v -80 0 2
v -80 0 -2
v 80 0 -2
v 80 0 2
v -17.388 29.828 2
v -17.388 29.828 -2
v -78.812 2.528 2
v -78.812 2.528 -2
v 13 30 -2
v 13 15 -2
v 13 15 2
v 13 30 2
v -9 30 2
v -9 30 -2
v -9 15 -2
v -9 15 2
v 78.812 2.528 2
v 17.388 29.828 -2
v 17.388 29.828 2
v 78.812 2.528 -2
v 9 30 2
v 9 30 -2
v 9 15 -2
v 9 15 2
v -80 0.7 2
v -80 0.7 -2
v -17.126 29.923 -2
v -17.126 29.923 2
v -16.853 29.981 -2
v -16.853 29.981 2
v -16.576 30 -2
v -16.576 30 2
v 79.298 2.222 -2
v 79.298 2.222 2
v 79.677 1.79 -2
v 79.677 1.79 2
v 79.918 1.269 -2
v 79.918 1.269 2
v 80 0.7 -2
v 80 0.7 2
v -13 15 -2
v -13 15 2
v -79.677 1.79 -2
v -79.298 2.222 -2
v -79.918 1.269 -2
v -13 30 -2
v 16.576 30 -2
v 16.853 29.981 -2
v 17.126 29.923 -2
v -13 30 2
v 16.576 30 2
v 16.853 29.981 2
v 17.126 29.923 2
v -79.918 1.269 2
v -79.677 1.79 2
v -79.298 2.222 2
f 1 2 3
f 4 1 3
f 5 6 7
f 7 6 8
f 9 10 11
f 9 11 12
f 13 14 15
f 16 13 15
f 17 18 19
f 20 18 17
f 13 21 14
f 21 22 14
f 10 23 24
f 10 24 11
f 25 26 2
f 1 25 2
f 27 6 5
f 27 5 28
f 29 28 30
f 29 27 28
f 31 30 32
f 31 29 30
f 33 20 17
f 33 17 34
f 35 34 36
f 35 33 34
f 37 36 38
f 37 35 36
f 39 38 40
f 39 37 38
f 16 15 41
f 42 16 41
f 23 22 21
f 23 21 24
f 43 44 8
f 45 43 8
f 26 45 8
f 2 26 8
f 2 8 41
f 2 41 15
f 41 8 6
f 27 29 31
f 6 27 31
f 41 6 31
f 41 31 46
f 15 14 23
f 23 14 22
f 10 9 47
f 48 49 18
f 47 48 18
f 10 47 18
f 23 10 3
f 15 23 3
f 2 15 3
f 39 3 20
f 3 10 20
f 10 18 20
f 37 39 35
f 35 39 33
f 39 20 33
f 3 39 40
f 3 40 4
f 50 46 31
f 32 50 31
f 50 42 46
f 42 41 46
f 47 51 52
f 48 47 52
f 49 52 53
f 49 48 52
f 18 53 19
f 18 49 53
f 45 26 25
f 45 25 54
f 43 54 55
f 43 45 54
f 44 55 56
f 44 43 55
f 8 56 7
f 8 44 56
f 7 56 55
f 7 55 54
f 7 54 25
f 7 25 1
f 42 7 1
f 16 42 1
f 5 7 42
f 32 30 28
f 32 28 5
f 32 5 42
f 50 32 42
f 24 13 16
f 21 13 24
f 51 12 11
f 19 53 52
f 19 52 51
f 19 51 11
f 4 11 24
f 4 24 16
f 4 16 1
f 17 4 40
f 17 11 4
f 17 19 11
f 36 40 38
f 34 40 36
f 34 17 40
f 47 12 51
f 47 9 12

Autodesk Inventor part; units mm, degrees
ref_plane "YZ Plane" through (0, 0, 0) normal (1, 0, 0) x (0, 1, 0)
ref_plane "XZ Plane" through (0, 0, 0) normal (0, 1, 0) x (-1, 0, 0)
ref_plane "XY Plane" through (0, 0, 0) normal (0, 0, 1) x (1, 0, 0)
sketch "Náčrt1" plane through (0, 0, 0) normal (0, 0, 1) x (1, 0, 0)
  line L0 (0, 0) -> (0, 30)
  line L1 (0, 30) -> (-9, 30)
  line L2 (-9, 30) -> (-9, 15)
  line L3 (-9, 15) -> (-13, 15)
  line L4 (-13, 15) -> (-13, 30)
  line L5 (-13, 30) -> (-16.5756, 30)
  line L6 (-17.3878, 29.8276) -> (-78.8123, 2.5279)
  line L7 (-80, 0.7003) -> (-80, 0)
  line L8 (-80, 0) -> (0, 0)
  arc A0 (-78.8123, 2.5279) -> (-80, 0.7003) centre (-78, 0.7003) ccw
  arc A1 (-16.5756, 30) -> (-17.3878, 29.8276) centre (-16.5756, 28) ccw
  line L9 (0, 30) -> (9, 30)
  line L10 (9, 30) -> (9, 15)
  line L11 (9, 15) -> (13, 15)
  line L12 (13, 15) -> (13, 30)
  line L13 (13, 30) -> (16.5756, 30)
  line L14 (17.3878, 29.8276) -> (78.8123, 2.5279)
  line L15 (80, 0.7003) -> (80, 0)
  line L16 (80, 0) -> (0, 0)
  arc A2 (80, 0.7003) -> (78.8123, 2.5279) centre (78, 0.7003) ccw
  arc A3 (17.3878, 29.8276) -> (16.5756, 30) centre (16.5756, 28) ccw
  point P0 (-17, 30)
  point P1 (-80, 2)
  point P2 (17, 30)
  point P3 (80, 2)
  dimension "d0" = 15
  dimension "d1" = 15
  dimension "d4" = 4
  dimension "d5" = 4
  dimension "d6" = 9
  dimension "d7" = 2
  dimension "d8" = 80
  dimension "d9" = 2
extrude "Vysunutí1" add sketch "Náčrt1" along normal mid plane 4
equation "\"d10\" = d4"
properties part number "Leg"
